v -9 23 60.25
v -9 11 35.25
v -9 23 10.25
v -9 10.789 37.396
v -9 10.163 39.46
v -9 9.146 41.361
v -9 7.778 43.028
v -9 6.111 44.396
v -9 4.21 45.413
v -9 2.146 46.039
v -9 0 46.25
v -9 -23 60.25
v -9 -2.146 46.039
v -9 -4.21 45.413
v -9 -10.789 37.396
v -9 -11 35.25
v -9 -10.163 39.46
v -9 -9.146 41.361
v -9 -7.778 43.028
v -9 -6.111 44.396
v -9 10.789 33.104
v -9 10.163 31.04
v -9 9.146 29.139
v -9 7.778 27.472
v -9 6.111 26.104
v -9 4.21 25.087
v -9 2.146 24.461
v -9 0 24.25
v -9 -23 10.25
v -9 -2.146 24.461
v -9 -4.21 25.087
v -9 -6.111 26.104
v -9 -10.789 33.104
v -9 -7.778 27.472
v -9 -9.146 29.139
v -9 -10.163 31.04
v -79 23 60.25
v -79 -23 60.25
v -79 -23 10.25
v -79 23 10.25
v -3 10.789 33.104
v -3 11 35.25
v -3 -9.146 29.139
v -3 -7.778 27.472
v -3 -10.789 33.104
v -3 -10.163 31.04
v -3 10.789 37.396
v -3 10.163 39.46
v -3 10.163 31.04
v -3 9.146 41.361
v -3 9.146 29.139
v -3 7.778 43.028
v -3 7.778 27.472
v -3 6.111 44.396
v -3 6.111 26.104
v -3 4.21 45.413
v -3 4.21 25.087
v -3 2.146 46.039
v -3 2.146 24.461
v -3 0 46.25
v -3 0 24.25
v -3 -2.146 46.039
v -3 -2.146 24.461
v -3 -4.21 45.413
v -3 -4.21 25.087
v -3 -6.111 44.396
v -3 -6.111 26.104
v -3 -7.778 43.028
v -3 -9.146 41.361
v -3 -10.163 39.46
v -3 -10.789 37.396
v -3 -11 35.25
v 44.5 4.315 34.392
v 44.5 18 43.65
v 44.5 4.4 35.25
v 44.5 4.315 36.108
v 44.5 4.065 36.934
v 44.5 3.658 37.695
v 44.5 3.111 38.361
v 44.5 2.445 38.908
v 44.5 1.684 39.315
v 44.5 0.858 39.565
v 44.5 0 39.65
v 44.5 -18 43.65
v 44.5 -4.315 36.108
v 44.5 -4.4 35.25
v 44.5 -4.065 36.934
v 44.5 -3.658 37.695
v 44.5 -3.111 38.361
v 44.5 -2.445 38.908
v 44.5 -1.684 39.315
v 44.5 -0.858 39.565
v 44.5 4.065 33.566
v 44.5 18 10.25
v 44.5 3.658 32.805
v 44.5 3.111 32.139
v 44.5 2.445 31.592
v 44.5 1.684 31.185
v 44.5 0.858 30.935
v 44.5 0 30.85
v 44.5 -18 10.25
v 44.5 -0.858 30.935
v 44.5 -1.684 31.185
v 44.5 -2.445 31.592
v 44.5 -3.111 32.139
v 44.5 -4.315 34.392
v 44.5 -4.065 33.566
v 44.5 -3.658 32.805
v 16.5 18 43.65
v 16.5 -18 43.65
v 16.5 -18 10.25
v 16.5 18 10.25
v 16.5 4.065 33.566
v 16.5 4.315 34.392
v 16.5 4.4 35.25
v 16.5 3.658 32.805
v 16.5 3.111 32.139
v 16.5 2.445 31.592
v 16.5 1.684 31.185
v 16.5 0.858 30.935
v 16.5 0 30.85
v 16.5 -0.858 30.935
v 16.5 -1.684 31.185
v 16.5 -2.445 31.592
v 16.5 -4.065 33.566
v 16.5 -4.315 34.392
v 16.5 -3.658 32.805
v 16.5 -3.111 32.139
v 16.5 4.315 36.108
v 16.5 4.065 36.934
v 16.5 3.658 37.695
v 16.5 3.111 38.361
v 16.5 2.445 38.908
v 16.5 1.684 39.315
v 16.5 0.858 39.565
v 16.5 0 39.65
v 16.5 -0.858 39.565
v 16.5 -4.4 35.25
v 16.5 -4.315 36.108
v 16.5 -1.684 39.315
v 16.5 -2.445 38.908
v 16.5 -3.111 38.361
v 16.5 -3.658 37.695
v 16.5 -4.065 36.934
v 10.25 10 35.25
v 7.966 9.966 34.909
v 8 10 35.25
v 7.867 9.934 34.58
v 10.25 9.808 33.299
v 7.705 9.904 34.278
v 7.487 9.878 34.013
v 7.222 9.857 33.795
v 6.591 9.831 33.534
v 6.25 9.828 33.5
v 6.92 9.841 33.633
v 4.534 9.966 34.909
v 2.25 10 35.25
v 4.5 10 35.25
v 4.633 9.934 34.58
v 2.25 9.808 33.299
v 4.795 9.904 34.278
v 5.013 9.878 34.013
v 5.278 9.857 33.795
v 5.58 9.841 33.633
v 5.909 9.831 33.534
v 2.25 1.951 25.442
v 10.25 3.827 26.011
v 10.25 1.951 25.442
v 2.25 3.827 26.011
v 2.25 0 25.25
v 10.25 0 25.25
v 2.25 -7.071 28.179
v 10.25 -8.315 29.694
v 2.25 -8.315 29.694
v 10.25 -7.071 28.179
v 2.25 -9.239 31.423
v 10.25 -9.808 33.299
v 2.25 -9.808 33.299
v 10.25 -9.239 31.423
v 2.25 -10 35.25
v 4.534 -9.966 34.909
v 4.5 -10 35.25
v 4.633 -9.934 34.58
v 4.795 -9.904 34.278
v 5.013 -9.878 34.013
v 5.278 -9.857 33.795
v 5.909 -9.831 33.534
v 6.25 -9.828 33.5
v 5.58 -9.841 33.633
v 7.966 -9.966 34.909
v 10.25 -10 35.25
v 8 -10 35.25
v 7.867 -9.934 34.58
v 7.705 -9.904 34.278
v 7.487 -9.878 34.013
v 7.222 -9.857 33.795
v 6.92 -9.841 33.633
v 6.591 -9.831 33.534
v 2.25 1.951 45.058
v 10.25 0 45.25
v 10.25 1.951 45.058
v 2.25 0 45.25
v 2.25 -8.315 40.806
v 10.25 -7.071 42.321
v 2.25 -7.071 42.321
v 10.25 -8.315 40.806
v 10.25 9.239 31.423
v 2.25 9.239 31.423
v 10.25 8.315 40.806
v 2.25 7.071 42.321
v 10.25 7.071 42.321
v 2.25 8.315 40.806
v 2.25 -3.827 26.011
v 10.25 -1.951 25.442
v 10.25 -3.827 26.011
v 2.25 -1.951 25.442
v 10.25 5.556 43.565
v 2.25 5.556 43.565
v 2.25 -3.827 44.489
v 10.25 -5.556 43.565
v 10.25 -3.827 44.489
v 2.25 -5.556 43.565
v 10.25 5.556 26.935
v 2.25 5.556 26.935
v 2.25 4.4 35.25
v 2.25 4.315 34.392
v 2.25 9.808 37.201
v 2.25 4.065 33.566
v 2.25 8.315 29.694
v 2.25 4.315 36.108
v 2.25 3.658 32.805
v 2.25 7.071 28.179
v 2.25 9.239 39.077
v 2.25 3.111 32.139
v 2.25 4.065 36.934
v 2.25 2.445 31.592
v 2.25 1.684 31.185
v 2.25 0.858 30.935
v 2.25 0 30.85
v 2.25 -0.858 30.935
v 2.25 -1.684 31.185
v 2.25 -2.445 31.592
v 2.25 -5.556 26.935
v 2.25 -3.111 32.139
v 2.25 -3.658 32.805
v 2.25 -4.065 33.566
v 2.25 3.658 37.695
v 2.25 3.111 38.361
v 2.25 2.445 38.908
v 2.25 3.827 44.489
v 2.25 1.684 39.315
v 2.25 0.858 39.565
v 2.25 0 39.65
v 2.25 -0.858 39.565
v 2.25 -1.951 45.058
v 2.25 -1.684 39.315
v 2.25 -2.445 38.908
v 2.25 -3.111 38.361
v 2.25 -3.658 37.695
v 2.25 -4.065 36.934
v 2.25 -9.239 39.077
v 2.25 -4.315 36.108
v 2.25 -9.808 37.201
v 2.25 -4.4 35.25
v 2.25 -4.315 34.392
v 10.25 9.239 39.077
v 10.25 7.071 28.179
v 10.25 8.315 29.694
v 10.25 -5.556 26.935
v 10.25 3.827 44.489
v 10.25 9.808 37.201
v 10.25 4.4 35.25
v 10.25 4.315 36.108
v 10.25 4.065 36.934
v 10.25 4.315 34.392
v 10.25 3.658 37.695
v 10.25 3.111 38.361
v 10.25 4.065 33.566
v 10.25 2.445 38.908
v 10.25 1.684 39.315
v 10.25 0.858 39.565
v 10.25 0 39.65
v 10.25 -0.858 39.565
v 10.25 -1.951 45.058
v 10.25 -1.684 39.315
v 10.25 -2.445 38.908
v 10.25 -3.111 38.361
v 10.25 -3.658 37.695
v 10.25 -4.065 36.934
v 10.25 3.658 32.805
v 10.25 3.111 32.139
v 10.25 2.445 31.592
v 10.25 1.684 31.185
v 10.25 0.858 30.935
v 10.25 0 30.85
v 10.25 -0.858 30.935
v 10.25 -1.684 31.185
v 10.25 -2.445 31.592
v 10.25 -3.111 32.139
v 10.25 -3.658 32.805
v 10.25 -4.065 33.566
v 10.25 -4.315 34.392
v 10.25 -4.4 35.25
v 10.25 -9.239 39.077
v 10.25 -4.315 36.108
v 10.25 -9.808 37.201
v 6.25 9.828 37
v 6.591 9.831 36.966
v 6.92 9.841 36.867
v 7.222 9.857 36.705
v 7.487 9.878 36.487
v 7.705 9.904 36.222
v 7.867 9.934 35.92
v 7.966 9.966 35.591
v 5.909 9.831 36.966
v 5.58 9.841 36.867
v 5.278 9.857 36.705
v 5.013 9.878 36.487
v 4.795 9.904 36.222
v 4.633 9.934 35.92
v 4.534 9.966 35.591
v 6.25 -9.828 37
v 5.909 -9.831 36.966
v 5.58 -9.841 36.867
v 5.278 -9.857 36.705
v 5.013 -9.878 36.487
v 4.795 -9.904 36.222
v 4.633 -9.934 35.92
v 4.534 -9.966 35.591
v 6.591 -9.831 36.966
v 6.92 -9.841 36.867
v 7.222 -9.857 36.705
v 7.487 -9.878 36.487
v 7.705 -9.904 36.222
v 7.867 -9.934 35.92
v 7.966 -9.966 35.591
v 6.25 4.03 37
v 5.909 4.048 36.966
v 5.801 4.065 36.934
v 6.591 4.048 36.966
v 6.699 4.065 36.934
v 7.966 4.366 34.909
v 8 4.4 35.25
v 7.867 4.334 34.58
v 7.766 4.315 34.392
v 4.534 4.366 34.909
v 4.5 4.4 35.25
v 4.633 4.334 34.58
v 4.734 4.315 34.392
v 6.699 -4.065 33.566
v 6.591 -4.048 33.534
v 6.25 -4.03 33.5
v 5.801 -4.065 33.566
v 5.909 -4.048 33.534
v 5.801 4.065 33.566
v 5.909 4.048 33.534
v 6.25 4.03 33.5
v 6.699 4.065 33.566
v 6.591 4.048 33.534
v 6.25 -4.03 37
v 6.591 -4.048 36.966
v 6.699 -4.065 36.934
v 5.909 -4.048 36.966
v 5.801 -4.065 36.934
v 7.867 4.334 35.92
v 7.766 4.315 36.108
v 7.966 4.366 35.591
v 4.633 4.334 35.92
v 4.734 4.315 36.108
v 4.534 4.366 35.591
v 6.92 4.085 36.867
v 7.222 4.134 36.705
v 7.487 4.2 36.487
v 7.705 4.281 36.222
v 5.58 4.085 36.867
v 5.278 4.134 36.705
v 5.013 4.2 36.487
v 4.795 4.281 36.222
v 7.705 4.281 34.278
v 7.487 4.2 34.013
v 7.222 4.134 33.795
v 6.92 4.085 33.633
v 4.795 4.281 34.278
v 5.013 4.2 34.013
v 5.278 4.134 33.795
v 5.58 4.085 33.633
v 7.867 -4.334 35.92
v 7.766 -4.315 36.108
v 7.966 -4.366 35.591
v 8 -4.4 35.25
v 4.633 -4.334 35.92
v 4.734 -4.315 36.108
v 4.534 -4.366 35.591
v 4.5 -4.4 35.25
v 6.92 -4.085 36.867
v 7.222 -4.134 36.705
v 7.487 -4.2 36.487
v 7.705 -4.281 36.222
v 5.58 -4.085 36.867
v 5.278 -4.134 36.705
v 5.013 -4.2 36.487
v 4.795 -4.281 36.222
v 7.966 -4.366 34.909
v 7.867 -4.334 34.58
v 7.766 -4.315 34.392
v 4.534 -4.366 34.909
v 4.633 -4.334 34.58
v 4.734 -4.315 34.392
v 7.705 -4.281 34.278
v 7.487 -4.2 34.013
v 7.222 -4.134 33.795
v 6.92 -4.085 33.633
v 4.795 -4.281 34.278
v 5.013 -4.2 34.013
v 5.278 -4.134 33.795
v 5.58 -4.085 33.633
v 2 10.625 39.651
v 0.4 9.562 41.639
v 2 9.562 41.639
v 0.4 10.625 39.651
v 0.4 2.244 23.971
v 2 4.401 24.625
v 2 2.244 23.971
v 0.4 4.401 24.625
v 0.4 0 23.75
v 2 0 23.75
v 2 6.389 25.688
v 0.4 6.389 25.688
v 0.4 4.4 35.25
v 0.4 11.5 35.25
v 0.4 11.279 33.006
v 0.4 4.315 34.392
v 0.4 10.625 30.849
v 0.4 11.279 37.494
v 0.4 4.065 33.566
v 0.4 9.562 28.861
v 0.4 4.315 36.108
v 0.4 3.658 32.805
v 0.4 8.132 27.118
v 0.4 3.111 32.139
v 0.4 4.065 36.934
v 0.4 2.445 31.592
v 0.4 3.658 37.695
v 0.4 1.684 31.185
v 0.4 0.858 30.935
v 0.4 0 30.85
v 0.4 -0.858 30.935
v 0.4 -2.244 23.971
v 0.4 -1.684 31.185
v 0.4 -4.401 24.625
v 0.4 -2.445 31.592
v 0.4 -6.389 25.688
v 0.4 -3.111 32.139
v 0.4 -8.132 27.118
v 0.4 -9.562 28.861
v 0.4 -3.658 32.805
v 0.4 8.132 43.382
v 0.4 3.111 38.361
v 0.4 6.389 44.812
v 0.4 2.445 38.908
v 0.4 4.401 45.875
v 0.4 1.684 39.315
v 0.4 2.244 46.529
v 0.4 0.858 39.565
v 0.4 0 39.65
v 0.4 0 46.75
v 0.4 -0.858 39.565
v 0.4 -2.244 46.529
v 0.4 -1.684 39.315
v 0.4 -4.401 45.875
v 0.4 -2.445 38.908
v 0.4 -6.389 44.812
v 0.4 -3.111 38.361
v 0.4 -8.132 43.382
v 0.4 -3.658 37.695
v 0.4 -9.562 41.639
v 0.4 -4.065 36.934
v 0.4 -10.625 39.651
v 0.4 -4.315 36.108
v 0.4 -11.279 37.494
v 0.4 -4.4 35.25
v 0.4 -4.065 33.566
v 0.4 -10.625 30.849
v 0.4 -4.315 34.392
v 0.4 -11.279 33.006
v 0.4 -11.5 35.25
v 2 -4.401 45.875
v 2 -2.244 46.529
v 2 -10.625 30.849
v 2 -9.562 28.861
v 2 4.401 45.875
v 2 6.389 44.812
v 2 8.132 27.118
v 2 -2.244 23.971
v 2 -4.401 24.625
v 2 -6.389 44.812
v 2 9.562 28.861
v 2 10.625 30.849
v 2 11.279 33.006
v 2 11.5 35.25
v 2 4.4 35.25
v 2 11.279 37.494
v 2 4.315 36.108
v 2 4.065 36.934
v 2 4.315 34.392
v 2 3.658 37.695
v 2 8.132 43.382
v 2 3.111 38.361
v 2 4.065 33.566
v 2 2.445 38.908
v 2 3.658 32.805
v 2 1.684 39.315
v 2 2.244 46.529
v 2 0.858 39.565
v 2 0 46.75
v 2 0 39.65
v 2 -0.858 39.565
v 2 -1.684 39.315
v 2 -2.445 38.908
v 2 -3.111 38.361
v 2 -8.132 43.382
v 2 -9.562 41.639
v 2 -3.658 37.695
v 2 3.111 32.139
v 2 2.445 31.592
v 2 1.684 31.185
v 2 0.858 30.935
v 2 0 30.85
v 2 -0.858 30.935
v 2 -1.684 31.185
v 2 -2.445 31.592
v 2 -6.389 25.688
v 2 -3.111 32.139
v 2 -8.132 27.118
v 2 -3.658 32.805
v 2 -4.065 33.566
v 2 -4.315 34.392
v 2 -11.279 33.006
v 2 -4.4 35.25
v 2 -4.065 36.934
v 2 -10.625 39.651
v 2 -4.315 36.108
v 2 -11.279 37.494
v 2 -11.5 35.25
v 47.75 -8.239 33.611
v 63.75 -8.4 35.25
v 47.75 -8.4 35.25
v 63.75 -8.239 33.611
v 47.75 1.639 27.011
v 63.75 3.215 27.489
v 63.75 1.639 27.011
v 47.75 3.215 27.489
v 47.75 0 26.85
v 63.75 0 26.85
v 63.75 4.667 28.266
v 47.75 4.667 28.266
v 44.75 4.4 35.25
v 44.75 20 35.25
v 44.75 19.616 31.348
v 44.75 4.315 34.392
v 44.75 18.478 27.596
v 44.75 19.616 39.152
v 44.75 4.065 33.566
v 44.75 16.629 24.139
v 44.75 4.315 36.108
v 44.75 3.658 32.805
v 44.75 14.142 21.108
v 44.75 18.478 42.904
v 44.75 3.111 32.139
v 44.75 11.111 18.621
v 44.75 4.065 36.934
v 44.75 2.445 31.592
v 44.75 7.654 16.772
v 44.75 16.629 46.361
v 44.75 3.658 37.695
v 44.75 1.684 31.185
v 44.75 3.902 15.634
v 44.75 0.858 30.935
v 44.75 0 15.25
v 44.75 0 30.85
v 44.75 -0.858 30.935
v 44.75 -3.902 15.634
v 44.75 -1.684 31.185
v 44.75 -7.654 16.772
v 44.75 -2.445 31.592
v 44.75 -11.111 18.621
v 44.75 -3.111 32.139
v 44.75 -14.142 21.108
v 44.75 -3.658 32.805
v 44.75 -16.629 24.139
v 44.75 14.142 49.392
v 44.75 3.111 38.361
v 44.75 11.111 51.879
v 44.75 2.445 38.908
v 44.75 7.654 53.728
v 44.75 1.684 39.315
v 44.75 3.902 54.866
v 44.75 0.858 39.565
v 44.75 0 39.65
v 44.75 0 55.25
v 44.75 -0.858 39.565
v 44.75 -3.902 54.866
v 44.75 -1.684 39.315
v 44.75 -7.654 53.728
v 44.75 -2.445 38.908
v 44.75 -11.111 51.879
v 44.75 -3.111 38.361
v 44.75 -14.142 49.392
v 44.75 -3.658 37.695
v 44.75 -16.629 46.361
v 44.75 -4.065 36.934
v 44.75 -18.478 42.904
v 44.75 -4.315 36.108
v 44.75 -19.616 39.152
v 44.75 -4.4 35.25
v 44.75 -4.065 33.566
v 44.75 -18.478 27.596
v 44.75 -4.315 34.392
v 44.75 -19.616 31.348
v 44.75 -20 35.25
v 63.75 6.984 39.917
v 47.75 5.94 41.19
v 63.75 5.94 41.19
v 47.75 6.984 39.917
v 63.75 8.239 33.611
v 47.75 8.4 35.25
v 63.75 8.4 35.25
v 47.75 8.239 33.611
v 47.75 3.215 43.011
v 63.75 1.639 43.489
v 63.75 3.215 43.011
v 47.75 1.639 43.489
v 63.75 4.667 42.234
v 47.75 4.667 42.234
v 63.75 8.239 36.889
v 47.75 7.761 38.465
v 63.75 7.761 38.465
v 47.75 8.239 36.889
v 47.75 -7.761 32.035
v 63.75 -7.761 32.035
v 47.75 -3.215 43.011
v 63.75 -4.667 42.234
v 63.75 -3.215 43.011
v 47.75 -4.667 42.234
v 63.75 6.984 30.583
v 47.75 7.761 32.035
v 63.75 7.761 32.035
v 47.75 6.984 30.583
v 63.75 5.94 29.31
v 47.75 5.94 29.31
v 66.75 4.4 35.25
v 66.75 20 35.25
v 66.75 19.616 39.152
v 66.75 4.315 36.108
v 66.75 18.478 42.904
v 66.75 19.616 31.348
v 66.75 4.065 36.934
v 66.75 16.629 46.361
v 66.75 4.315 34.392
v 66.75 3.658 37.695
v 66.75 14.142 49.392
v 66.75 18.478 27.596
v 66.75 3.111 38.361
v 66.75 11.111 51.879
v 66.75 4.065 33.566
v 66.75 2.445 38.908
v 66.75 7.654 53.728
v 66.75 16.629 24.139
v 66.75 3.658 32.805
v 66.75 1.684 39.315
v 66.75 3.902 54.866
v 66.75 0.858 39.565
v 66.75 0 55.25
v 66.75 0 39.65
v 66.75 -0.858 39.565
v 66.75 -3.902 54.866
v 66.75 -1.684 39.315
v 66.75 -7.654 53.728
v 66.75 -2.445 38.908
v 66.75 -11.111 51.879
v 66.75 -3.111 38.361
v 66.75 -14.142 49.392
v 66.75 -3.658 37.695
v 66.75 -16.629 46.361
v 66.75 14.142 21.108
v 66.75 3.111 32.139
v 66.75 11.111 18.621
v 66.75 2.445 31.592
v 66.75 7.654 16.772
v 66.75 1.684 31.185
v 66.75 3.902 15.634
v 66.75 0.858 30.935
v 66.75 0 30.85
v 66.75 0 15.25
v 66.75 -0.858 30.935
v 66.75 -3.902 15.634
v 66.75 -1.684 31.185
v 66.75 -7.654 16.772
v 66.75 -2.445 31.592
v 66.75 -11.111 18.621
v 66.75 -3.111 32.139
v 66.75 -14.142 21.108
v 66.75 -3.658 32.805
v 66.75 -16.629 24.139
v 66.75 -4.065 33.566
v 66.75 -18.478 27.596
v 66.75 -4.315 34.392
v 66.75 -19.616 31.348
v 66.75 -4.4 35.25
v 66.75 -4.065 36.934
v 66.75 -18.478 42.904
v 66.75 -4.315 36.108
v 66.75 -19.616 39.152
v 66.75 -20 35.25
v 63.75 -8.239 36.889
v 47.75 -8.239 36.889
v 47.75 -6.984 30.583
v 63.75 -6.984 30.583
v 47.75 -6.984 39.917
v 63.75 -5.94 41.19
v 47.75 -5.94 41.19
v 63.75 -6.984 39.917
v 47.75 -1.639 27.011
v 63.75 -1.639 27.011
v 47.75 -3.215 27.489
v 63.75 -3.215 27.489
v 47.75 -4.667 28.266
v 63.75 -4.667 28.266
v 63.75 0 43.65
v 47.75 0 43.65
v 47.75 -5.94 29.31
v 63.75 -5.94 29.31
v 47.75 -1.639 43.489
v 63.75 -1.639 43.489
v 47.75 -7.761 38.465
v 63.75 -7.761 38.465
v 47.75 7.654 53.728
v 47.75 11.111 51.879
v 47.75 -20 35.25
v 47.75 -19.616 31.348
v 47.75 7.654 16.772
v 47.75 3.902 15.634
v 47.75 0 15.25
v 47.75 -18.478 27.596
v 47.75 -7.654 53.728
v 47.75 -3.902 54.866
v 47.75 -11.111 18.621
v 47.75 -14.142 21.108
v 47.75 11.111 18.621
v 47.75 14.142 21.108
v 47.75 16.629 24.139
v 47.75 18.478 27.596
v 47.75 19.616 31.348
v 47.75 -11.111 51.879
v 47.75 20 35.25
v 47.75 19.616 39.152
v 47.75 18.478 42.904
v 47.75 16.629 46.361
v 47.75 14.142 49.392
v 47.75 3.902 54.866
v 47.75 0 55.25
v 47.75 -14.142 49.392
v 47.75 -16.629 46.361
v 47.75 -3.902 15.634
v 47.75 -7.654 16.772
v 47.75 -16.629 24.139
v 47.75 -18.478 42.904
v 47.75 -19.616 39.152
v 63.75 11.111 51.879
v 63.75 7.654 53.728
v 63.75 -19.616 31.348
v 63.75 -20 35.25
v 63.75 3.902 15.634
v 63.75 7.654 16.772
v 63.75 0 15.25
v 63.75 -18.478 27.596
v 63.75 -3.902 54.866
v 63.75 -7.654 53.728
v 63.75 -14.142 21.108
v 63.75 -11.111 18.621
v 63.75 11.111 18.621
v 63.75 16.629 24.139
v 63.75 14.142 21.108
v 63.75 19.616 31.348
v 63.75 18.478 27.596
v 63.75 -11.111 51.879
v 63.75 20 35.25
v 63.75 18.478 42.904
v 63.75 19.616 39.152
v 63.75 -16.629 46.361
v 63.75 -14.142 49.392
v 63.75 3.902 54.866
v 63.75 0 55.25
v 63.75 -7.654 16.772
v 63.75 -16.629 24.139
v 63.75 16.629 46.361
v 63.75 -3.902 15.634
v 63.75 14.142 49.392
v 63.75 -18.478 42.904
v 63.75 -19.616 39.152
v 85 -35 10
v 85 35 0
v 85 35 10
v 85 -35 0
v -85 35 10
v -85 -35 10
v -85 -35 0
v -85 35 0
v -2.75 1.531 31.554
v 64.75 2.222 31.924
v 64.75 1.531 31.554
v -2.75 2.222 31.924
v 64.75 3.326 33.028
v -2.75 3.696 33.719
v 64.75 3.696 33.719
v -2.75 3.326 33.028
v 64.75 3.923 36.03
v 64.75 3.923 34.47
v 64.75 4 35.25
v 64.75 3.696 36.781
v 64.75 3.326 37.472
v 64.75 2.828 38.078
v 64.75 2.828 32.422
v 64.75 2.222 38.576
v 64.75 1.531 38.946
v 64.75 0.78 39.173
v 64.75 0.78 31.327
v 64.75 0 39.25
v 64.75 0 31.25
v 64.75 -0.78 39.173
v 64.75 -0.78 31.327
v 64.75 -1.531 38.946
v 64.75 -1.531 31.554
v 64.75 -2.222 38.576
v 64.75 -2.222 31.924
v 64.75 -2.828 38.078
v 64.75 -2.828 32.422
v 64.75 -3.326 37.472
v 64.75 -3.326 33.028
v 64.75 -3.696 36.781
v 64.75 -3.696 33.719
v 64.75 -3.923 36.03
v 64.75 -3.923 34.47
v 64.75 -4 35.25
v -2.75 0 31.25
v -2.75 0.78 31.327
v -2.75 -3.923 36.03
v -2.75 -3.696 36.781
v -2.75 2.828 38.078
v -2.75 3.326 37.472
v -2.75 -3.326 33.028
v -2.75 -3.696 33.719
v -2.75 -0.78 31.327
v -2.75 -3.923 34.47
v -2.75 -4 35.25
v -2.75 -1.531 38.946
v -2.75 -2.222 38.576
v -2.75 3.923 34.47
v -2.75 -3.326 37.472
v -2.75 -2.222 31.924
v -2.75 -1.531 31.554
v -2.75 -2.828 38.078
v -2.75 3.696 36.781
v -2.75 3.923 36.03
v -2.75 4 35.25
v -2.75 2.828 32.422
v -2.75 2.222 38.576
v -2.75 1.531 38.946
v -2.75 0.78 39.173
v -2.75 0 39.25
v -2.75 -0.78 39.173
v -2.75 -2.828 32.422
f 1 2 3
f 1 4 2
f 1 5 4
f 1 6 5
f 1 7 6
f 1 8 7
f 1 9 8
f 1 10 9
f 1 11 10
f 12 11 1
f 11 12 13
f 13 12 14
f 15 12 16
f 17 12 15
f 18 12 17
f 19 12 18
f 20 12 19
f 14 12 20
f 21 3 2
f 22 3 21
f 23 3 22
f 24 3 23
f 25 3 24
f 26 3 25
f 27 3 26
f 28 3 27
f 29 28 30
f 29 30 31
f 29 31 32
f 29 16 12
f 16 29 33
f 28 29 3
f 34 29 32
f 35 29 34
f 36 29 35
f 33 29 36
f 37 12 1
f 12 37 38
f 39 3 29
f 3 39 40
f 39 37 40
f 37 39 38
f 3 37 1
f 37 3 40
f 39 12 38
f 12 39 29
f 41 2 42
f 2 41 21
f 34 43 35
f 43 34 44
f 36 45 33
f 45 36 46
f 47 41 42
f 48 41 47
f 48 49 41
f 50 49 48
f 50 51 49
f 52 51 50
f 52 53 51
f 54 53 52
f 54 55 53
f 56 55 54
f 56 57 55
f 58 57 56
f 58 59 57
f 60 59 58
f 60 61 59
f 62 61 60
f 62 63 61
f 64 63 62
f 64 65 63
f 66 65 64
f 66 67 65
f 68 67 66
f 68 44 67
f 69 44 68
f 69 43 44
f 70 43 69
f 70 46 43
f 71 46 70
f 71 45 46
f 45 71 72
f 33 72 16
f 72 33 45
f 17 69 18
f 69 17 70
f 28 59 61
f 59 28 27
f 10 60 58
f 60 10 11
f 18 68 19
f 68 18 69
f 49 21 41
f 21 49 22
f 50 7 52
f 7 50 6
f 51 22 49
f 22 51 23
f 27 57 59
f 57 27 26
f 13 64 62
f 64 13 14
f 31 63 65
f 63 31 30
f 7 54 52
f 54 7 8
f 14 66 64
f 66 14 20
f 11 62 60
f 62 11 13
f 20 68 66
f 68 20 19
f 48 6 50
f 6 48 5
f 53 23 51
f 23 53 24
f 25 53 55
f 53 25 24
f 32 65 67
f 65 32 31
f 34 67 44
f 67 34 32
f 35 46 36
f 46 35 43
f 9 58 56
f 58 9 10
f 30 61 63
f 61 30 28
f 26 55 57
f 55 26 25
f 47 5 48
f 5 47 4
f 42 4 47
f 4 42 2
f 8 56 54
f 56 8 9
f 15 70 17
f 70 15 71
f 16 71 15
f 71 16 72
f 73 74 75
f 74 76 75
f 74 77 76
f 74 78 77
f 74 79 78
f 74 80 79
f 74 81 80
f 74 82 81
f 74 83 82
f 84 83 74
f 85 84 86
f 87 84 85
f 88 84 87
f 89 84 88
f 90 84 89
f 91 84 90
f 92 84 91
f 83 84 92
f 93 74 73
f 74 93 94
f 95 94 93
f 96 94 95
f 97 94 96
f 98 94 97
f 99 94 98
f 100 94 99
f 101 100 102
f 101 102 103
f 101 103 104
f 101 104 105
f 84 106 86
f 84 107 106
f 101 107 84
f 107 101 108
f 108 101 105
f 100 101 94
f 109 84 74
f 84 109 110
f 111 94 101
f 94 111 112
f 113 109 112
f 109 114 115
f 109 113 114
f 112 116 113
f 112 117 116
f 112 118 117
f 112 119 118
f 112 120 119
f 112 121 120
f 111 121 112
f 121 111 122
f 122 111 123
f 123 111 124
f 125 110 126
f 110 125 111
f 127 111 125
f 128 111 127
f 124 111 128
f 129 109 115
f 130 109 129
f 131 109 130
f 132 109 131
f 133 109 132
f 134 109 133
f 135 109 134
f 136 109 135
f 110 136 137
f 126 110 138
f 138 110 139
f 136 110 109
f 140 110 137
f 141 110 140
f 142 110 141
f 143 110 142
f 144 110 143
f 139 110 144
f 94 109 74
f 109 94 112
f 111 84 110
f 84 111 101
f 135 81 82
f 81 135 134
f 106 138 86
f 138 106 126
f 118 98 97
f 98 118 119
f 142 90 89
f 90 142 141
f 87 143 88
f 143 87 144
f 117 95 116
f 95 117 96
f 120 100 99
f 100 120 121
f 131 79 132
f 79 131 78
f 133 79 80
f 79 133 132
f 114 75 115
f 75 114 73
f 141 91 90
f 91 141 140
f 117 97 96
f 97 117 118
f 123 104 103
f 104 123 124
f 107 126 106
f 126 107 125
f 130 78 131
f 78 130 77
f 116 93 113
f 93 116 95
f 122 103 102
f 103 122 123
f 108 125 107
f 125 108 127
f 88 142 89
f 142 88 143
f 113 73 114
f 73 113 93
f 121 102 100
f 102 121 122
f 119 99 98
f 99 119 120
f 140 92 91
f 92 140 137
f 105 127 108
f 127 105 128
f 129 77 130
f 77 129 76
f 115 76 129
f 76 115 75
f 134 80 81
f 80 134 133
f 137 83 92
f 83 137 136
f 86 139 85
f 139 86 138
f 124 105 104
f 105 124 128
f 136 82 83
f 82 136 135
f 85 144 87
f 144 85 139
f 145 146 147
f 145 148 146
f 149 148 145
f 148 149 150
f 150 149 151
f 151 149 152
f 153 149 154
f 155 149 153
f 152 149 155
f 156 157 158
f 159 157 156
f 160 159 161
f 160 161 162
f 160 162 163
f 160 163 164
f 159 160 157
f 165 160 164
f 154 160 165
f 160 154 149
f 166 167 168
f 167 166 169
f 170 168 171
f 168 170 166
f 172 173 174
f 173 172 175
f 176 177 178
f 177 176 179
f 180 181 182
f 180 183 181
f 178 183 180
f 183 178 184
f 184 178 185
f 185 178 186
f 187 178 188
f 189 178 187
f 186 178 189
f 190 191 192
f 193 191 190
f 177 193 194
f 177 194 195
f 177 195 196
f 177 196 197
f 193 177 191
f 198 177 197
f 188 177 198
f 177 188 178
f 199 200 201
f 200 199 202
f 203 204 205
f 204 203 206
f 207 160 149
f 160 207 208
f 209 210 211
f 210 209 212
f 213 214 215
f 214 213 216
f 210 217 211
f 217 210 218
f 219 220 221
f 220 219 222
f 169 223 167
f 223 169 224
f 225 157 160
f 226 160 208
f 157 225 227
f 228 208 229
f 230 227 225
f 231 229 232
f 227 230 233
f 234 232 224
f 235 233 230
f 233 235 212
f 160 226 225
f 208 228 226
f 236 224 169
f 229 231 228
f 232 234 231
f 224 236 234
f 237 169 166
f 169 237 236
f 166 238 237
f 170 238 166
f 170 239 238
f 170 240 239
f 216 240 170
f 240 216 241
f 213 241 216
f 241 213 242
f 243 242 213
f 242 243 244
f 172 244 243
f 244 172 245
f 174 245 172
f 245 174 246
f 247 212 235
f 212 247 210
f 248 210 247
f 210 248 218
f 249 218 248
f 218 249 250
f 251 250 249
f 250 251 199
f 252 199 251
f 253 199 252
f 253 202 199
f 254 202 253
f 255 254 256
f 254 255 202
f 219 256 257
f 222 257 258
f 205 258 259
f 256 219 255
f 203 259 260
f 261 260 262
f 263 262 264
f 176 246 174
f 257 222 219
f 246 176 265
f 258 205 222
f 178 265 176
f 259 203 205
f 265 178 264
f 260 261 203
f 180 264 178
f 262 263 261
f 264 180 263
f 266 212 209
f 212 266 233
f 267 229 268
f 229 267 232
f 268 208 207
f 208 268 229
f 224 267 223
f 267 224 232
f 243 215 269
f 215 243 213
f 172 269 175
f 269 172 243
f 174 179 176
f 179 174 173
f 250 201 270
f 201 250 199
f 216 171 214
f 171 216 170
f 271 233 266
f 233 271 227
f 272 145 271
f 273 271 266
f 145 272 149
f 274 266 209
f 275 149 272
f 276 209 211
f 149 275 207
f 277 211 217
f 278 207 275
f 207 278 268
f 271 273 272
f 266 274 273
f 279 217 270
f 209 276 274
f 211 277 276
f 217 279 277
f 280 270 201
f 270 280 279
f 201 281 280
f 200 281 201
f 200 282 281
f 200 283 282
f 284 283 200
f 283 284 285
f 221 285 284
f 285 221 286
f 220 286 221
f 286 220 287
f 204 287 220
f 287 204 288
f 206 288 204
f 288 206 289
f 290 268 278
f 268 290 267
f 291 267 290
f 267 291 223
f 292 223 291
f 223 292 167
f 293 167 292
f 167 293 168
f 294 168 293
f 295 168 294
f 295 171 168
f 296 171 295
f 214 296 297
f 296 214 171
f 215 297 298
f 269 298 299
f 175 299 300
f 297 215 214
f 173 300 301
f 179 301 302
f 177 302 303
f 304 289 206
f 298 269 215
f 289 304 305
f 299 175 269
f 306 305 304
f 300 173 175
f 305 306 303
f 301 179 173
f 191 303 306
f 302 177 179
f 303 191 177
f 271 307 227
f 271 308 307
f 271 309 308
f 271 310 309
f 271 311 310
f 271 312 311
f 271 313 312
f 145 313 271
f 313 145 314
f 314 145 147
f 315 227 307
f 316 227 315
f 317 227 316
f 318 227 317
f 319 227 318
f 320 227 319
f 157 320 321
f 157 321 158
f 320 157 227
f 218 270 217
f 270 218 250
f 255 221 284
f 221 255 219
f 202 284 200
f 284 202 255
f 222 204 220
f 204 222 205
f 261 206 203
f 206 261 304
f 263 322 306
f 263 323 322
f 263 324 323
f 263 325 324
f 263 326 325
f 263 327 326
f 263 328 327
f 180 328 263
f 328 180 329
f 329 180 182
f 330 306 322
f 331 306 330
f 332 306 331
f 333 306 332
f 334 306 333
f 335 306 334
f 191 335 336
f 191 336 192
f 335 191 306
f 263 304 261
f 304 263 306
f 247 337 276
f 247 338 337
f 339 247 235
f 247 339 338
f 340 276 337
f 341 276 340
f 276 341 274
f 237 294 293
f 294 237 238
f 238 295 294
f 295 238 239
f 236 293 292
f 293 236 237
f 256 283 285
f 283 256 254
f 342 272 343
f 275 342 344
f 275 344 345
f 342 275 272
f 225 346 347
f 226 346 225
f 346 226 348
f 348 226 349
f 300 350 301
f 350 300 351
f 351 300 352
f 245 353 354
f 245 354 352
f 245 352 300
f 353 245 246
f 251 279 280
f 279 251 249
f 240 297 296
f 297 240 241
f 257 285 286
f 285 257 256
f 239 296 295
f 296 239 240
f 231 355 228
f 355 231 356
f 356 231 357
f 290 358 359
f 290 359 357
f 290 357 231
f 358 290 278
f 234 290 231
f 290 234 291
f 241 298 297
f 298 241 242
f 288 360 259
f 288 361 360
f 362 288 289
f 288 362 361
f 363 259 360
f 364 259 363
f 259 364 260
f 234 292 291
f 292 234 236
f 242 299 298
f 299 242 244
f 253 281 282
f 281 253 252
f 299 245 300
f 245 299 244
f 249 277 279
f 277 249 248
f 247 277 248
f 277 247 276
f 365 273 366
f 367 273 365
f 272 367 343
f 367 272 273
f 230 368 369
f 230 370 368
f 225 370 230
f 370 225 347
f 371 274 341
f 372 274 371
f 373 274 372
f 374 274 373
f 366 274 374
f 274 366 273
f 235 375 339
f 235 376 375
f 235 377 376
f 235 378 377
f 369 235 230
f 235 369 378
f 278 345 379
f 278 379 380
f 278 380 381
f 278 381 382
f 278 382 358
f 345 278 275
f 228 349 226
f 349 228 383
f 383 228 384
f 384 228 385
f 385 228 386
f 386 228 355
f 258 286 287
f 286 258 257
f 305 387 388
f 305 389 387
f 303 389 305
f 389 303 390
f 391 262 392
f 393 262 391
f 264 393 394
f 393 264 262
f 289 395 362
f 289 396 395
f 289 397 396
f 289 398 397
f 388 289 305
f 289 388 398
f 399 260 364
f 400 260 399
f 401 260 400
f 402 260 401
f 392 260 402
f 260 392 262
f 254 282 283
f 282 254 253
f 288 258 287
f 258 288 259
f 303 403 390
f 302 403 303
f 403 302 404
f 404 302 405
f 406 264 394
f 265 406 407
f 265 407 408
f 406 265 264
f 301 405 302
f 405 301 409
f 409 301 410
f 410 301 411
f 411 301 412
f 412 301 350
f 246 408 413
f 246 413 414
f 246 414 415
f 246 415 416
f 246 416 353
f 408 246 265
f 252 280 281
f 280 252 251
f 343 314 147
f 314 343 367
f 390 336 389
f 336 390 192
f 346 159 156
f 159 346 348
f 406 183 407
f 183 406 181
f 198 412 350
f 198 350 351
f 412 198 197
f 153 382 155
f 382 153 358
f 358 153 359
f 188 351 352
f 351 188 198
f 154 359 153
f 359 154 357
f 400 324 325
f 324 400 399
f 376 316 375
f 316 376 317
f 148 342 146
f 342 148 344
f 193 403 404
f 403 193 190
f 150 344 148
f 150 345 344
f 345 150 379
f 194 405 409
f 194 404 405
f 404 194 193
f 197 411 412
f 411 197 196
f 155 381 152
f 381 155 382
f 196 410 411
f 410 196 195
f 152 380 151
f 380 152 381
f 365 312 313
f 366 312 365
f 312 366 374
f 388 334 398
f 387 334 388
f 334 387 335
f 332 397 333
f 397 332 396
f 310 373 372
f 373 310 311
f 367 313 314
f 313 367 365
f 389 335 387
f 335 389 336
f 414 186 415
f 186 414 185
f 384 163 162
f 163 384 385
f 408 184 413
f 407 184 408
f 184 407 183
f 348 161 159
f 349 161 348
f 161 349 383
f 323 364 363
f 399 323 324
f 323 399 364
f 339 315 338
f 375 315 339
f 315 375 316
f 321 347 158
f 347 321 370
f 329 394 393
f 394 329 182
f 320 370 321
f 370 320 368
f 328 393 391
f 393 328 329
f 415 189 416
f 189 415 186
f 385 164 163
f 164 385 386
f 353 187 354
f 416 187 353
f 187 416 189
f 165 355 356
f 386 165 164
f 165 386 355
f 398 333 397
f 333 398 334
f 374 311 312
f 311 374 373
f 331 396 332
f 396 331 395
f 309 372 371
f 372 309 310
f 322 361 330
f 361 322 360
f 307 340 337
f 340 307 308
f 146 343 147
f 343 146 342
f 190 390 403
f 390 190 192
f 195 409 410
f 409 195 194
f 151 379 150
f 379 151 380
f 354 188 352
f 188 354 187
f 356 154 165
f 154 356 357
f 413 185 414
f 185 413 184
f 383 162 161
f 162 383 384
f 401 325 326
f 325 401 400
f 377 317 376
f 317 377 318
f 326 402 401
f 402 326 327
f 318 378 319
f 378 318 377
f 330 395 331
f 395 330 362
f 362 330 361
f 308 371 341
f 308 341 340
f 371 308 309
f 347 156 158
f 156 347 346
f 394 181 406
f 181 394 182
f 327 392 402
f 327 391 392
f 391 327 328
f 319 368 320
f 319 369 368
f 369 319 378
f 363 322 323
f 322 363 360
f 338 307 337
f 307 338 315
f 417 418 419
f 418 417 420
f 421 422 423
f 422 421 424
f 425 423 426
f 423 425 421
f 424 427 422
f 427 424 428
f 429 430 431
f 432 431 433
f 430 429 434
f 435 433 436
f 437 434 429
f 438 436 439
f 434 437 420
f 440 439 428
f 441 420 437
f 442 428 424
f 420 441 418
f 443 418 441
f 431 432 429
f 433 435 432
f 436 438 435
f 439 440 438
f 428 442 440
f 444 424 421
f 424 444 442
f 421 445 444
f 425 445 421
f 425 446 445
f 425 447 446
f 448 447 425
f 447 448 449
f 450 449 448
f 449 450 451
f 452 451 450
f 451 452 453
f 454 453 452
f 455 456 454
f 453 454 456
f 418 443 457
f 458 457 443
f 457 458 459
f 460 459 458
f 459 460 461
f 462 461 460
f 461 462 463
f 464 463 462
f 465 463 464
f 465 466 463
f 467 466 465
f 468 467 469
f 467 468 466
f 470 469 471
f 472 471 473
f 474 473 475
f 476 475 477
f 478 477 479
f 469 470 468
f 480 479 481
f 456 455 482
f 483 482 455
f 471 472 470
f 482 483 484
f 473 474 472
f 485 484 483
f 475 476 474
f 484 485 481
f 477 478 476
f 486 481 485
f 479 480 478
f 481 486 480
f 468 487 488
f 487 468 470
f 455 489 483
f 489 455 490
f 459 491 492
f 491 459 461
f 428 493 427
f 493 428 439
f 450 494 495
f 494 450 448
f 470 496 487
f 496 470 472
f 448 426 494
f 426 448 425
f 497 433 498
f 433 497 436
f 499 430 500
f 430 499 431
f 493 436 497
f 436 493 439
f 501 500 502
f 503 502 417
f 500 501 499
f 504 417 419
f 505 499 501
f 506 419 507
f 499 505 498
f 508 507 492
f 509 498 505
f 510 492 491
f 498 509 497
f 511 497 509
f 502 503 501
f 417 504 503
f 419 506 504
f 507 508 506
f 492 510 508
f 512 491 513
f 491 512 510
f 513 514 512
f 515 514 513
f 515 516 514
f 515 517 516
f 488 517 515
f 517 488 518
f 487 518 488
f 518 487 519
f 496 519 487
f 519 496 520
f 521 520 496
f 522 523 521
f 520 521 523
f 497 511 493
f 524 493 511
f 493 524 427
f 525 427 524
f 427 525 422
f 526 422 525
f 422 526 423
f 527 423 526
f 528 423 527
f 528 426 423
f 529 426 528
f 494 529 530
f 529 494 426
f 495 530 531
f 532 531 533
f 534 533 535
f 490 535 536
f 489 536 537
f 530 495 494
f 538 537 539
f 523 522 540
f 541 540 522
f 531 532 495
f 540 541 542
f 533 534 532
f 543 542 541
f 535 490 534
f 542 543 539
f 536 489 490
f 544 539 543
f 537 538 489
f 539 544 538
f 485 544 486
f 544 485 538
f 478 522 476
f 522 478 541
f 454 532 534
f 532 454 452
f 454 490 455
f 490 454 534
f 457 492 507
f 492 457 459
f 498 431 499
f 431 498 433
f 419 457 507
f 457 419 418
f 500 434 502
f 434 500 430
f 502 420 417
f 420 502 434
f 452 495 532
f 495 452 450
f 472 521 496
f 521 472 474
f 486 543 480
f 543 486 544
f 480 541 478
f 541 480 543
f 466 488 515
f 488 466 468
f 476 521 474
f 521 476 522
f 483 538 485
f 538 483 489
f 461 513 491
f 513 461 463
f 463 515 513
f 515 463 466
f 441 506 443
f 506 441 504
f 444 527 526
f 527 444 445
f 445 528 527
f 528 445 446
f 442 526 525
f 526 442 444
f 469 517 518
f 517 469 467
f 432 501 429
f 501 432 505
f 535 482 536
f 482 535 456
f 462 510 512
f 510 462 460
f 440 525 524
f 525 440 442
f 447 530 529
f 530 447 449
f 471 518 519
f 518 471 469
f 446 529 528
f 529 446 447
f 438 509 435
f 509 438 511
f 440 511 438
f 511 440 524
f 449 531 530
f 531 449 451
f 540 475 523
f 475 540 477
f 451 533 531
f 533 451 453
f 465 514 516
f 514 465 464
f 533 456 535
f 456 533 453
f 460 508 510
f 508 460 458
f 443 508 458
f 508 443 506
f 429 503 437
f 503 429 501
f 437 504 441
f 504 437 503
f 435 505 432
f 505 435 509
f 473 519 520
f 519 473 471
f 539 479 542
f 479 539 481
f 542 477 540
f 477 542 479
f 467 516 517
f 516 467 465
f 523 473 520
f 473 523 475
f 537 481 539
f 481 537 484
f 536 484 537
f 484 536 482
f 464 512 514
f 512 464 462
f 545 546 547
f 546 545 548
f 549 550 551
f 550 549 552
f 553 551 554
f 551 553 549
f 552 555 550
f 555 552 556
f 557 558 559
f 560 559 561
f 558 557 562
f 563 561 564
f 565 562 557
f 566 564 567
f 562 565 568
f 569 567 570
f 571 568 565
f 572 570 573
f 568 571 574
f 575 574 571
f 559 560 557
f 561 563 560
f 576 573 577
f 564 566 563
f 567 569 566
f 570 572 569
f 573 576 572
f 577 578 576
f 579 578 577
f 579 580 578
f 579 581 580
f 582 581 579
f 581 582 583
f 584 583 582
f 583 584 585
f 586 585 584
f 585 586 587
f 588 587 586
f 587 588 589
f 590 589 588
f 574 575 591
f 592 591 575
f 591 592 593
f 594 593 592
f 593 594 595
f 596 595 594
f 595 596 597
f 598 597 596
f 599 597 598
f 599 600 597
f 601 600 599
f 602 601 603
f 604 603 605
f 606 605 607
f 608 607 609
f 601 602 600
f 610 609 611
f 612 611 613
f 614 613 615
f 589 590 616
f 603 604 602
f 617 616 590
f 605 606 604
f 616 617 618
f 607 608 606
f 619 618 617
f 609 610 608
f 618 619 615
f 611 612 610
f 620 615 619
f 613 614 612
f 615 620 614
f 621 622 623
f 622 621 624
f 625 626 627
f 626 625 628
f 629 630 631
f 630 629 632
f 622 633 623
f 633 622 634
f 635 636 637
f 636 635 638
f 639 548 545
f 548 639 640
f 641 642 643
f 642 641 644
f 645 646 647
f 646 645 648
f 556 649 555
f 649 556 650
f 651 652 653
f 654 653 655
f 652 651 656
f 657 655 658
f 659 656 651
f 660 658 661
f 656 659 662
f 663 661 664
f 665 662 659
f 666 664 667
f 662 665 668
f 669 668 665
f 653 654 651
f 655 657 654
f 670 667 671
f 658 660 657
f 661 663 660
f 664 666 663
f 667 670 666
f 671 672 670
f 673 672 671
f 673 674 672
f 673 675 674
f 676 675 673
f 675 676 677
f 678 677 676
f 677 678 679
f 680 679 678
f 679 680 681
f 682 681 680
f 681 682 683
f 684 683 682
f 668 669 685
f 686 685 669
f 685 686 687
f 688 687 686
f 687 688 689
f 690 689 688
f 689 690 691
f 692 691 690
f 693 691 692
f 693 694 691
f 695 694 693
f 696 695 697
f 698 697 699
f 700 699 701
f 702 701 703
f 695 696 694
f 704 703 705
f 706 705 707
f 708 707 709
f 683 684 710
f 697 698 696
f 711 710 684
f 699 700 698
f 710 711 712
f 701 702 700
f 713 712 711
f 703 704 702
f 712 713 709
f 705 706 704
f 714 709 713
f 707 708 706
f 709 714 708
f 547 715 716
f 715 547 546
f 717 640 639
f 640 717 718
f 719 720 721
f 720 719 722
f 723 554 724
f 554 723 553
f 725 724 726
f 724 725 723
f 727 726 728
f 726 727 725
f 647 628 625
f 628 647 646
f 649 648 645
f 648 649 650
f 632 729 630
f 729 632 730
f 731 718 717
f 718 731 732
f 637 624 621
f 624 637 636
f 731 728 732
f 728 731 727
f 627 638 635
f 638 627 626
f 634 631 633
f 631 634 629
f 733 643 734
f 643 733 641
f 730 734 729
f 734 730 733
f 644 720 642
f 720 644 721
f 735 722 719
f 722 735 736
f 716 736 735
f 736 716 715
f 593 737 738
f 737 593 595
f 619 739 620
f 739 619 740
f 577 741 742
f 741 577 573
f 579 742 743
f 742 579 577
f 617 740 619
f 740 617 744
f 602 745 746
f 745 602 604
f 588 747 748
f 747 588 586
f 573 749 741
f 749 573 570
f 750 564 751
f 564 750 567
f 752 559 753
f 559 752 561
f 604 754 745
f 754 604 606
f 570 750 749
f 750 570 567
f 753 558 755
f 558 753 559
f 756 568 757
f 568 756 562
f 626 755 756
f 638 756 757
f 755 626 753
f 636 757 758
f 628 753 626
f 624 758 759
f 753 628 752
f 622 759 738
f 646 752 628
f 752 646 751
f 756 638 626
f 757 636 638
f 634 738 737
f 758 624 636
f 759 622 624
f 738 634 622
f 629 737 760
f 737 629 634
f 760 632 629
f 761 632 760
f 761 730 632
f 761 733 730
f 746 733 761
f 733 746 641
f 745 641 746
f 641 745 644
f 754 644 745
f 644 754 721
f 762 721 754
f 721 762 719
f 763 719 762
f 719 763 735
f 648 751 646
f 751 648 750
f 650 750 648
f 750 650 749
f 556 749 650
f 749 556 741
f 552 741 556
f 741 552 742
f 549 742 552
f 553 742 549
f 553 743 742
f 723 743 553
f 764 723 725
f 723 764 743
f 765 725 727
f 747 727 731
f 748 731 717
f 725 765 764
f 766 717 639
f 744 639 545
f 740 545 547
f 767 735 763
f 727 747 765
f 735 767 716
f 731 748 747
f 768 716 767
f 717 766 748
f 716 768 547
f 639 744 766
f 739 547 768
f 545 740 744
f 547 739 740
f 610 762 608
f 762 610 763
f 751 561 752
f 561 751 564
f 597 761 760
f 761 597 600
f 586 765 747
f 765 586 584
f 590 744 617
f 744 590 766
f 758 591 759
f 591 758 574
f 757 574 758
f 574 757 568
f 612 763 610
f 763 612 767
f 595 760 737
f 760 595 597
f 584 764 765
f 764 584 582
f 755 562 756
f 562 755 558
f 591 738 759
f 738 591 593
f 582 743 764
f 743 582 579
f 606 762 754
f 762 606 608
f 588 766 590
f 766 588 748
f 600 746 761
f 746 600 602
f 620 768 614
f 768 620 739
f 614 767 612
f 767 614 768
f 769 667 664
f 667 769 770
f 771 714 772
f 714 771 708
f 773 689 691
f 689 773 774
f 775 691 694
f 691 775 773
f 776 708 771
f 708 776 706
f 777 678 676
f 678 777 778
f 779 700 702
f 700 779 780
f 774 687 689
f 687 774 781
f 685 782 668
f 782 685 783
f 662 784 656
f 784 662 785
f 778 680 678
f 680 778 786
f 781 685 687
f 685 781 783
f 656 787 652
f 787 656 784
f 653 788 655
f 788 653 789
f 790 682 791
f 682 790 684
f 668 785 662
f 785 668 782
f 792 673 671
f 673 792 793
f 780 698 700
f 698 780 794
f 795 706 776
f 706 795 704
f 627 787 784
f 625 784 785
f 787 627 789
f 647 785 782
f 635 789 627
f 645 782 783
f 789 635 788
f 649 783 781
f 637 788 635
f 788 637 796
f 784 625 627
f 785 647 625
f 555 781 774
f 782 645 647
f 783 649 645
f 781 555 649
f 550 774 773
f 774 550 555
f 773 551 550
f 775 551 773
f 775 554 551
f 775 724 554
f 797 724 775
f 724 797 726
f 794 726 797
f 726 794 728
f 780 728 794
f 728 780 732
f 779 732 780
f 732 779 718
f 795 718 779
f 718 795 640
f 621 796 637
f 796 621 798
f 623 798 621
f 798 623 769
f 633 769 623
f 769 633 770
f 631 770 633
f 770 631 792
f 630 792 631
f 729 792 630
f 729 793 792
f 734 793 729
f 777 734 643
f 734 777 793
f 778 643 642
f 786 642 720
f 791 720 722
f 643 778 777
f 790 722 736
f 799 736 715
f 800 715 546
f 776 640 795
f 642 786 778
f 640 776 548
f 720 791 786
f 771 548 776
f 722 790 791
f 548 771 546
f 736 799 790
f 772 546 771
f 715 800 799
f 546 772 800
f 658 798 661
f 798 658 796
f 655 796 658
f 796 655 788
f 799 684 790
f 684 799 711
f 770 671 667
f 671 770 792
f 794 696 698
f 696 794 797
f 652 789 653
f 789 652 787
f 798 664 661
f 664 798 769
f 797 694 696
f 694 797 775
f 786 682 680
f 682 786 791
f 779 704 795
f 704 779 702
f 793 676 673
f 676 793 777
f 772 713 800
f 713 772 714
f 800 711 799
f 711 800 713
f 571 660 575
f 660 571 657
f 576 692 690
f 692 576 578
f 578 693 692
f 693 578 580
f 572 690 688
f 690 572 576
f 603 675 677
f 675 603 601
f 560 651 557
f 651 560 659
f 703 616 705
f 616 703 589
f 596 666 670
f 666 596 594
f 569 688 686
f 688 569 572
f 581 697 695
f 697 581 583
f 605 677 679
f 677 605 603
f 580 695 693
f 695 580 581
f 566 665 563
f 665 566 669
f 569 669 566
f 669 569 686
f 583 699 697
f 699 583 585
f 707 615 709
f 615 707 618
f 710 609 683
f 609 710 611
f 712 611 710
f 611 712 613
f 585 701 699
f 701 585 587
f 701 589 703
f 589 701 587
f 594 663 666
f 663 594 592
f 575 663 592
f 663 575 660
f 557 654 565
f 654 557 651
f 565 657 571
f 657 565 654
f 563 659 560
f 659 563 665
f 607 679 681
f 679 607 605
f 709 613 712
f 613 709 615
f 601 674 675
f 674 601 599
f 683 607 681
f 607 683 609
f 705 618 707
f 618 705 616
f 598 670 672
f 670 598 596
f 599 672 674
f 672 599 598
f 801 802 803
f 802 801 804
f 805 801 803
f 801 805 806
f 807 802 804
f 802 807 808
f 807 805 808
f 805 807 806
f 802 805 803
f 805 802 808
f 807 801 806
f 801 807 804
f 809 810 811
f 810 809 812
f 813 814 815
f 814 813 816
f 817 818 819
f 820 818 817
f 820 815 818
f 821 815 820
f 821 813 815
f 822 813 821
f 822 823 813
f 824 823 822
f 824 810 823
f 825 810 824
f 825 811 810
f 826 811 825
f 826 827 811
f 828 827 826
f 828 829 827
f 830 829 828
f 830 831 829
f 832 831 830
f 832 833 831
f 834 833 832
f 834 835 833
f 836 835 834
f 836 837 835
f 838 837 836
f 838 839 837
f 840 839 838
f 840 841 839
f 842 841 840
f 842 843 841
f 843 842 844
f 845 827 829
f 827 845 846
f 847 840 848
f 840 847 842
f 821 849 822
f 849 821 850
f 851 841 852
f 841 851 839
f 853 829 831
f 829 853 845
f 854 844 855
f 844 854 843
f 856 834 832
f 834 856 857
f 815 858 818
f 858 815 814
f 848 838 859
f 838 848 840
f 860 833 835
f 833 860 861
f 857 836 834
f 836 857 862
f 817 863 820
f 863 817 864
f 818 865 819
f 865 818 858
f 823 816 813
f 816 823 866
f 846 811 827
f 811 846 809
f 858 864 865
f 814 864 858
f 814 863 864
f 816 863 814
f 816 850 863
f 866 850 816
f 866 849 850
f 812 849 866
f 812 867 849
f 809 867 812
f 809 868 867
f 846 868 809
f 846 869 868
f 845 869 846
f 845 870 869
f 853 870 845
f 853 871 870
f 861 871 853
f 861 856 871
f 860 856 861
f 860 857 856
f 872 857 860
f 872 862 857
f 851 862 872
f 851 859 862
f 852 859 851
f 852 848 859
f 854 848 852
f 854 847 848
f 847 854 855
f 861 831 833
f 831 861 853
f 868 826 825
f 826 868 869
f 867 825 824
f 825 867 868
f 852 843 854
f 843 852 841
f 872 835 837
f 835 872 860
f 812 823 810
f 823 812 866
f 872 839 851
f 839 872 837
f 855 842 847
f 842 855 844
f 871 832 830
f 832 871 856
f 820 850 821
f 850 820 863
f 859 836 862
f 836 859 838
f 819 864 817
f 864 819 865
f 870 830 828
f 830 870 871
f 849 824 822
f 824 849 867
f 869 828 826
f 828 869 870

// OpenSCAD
$fn = 32;

// ------------------------------------------------------------------------
// Motor drive station: motor 70 x 50 mm, shaft d8, pulley d40
// Every part is its own module, assembly() places every instance.
// ------------------------------------------------------------------------

// --- part 1 ---
module station_bed() {
  difference() {
    translate([-85, -35, 0]) cube([170, 70, 10]);
  }
}

// --- part 2 ---
module drive_motor() {
  union() {
    translate([-35, -23, 0]) cube([70, 46, 50]);
    translate([38, 0, 25]) rotate([0, 90, 0]) cylinder(h = 6, d = 22, center = true);
  }
}

// --- part 3 ---
module pillow_block() {
  difference() {
    translate([-14, -18, 0]) cube([28, 36, 33.4]);
    translate([0, 0, 25]) rotate([0, 90, 0]) cylinder(h = 30, d = 8.8, center = true);
  }
}

// --- part 4 ---
module drive_shaft() {
  translate([0, 0, -33.75]) cylinder(h = 67.5, d = 8);
}

// --- part 5 ---
module shaft_collar() {
  difference() {
    cylinder(h = 8, d = 20);
    translate([0, 0, -1]) cylinder(h = 10, d = 8.8);
    translate([0, 0, 4]) rotate([90, 0, 0]) cylinder(h = 22, d = 3.5, center = true);
  }
}

// --- part 6 ---
module collar_washer() {
  difference() {
      translate([0, 0, 0]) cylinder(h = 1.6, d = 23);
      translate([0, 0, -1]) cylinder(h = 3.6, d = 8.8);
    }
}

// --- part 7 ---
module drive_pulley() {
  difference() {
    union() {
      cylinder(h = 22, d = 16.8);
      cylinder(h = 3, d = 40);
      translate([0, 0, 19]) cylinder(h = 3, d = 40);
    }
    translate([0, 0, -1]) cylinder(h = 24, d = 8.8);
  }
}

// --- assembly ---
module assembly() {
  color([0.80, 0.24, 0.20]) translate([0, 0, 0]) rotate([0, 0, 0]) station_bed();
  color([0.20, 0.45, 0.75]) translate([-44, 0, 10.25]) rotate([0, 0, 0]) drive_motor();
  color([0.25, 0.62, 0.32]) translate([30.5, 0, 10.25]) rotate([0, 0, 0]) pillow_block();
  color([0.92, 0.70, 0.18]) translate([31, 0, 35.25]) rotate([0, 90, 0]) drive_shaft();
  color([0.58, 0.35, 0.70]) translate([2.25, 0, 35.25]) rotate([0, 90, 0]) shaft_collar();
  color([0.16, 0.66, 0.66]) translate([0.4, 0, 35.25]) rotate([0, 90, 0]) collar_washer();
  color([0.85, 0.48, 0.18]) translate([44.75, 0, 35.25]) rotate([0, 90, 0]) drive_pulley();
}

assembly();
